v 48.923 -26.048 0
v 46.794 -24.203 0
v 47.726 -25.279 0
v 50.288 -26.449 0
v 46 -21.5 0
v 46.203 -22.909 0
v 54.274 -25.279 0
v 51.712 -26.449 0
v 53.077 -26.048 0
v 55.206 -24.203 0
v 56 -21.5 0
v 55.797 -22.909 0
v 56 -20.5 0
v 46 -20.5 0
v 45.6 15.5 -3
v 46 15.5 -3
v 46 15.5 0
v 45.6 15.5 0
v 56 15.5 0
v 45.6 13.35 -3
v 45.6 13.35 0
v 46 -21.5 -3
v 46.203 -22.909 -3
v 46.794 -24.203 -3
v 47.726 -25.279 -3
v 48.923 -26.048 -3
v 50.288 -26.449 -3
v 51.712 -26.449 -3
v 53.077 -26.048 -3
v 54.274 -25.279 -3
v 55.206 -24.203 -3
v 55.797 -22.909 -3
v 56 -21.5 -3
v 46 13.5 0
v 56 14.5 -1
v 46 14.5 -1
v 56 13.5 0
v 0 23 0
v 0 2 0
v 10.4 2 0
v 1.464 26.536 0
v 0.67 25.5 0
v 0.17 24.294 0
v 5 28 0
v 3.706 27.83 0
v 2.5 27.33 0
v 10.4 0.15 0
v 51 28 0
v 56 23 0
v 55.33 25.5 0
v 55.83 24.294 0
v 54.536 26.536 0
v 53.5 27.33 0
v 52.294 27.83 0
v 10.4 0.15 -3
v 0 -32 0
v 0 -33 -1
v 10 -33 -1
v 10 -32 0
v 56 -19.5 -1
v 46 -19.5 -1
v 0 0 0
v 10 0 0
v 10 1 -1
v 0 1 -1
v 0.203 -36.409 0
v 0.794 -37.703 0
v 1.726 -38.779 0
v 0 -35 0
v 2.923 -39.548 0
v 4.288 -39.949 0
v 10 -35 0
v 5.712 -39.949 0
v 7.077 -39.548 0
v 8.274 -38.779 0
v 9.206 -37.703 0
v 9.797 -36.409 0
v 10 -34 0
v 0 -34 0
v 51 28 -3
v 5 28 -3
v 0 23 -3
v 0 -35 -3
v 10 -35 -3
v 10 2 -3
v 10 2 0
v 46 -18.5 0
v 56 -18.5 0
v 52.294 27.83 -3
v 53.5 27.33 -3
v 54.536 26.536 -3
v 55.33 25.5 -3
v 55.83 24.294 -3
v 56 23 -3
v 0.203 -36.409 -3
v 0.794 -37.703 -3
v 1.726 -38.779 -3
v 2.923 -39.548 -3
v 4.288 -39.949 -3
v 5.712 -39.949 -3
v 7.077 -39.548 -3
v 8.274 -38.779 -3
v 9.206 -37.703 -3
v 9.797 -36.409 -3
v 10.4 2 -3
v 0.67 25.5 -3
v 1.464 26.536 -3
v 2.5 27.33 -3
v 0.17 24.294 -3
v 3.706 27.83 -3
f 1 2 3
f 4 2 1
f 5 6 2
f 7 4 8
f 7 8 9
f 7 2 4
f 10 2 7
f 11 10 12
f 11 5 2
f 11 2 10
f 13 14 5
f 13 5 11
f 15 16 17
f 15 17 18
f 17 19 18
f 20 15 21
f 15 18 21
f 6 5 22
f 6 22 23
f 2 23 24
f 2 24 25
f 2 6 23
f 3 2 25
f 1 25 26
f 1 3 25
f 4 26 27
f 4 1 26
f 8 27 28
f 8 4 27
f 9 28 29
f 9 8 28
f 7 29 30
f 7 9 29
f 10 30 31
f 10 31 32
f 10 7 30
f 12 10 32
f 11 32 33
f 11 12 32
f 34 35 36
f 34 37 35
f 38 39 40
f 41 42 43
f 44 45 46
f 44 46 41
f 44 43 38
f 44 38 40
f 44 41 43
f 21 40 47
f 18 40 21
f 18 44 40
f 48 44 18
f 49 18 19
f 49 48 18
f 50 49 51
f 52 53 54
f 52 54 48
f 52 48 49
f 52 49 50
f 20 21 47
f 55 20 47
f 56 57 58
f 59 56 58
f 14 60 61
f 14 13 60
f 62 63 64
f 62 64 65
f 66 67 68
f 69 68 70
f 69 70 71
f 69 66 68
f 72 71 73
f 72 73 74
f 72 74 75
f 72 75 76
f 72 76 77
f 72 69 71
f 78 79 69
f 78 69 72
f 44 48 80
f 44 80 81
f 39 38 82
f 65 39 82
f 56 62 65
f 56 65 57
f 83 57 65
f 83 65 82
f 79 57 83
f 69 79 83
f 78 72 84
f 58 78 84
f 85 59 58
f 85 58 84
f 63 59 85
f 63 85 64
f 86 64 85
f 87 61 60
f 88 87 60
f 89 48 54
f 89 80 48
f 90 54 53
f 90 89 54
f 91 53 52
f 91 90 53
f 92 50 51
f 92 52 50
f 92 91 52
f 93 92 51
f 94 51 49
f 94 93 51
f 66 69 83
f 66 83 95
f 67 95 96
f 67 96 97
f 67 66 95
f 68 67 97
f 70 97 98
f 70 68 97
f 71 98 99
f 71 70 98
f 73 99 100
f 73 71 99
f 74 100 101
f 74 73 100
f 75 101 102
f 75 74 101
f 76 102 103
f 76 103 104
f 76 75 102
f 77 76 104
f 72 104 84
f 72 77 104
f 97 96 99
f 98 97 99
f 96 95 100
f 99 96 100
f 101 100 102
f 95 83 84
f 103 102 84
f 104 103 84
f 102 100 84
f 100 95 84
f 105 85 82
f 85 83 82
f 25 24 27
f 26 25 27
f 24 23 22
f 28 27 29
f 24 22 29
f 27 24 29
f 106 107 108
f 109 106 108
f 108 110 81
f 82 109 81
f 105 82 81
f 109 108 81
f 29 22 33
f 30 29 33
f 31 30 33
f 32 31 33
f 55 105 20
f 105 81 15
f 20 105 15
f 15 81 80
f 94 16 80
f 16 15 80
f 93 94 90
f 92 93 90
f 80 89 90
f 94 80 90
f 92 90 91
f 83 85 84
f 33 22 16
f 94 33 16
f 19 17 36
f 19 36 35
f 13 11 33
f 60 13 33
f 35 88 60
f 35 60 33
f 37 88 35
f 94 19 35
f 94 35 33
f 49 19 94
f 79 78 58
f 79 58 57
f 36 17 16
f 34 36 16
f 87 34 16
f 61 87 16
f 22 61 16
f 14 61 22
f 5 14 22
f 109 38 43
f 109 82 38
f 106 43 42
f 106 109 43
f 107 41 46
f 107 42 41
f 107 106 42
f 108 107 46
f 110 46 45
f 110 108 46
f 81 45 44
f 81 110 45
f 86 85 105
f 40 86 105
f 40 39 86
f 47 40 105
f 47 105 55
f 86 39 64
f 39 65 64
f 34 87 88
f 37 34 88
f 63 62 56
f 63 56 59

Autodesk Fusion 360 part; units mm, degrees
sketch "Sketch1" plane through (0, 0, 0) normal (0, 0, 1) x (1, 0, 0)
  line L0 (56, 13.5) -> (56, 28)
  line L1 (56, 28) -> (0, 28)
  line L2 (0, 28) -> (0, 0)
  line L3 (0, 0) -> (10, 0)
  line L4 (10, 0) -> (46, 0) construction
  line L5 (0, 0) -> (0, -35)
  arc A0 (0, -35) -> (10, -35) centre (5, -35) ccw
  line L6 (10, -35) -> (10, 0)
  line L7 (46, 0) -> (46, 13.5) construction
  line L8 (46, 13.5) -> (56, 13.5)
  line L9 (46, 13.5) -> (10, 0)
  line L10 (46, 13.5) -> (46, -21.5)
  arc A1 (46, -21.5) -> (56, -21.5) centre (51, -21.5) ccw
  line L11 (56, -21.5) -> (56, 13.5)
  line L12 (0, -33) -> (10, -33) construction
  line L13 (46, -19.5) -> (56, -19.5) construction
  line L14 (46, 15.5) -> (56, 15.5)
  line L15 (0, 2) -> (10, 2)
  line L16 (0, -32) -> (10, -32)
  line L17 (0, -34) -> (10, -34)
  line L18 (46, -18.5) -> (56, -18.5)
  line L19 (46, -20.5) -> (56, -20.5)
  line L20 (46, 15.5) -> (46, 13.5)
  line L21 (46, 15.5) -> (45.6, 15.5)
  line L22 (45.6, 15.5) -> (45.6, 13.35)
  line L23 (10, 0) -> (10, 2)
  line L24 (10, 2) -> (10.4, 2)
  line L25 (10.4, 2) -> (10.4, 0.15)
  dimension "d1" = 28
  dimension "d5" = 10
  dimension "d6" = 10
  dimension "d7" = 36
  dimension "d8" = 13.5
  dimension "d11" = 33
  dimension "d12" = 2
  dimension "d13" = 2
  dimension "d14" = 33
  dimension "d20" = 2
  dimension "d21" = 2
  dimension "d27" = 2
  dimension "d28" = 0.4
  dimension "d29" = 2
  dimension "d30" = 0.4
extrude "Extrude1" add sketch "Sketch1" against normal blind 3 contours L0 L8 L14 L20 | L8 L10 L11 L18 | L0 L1 L2 L9 L14 L15 L21 L22 L24 L25 | L10 L11 L18 L19 | L10 A1 L11 L19 | L2 L3 L15 L23 | L3 L5 L6 L16 | L5 L6 L16 L17 | L5 A0 L6 L17
extrude "Extrude2" cut sketch "Sketch1" against normal blind 1 contours L0 L8 L14 L20 | L10 L11 L18 L19 | L2 L3 L15 L23 | L5 L6 L16 L17
chamfer "Chamfer1" distance 1 angle 45 8 edges at (5, -32, -1) (5, -34, -1) (5, 2, -1) (5, 0, -1) (51, 13.5, -1) (51, 15.5, -1) (51, -20.5, -1) (51, -18.5, -1)
fillet "Fillet1" radius 5 2 edges at (56, 28, -1.5) (0, 28, -1.5)
equation "d13 = d12"
equation "d14 = d11"
